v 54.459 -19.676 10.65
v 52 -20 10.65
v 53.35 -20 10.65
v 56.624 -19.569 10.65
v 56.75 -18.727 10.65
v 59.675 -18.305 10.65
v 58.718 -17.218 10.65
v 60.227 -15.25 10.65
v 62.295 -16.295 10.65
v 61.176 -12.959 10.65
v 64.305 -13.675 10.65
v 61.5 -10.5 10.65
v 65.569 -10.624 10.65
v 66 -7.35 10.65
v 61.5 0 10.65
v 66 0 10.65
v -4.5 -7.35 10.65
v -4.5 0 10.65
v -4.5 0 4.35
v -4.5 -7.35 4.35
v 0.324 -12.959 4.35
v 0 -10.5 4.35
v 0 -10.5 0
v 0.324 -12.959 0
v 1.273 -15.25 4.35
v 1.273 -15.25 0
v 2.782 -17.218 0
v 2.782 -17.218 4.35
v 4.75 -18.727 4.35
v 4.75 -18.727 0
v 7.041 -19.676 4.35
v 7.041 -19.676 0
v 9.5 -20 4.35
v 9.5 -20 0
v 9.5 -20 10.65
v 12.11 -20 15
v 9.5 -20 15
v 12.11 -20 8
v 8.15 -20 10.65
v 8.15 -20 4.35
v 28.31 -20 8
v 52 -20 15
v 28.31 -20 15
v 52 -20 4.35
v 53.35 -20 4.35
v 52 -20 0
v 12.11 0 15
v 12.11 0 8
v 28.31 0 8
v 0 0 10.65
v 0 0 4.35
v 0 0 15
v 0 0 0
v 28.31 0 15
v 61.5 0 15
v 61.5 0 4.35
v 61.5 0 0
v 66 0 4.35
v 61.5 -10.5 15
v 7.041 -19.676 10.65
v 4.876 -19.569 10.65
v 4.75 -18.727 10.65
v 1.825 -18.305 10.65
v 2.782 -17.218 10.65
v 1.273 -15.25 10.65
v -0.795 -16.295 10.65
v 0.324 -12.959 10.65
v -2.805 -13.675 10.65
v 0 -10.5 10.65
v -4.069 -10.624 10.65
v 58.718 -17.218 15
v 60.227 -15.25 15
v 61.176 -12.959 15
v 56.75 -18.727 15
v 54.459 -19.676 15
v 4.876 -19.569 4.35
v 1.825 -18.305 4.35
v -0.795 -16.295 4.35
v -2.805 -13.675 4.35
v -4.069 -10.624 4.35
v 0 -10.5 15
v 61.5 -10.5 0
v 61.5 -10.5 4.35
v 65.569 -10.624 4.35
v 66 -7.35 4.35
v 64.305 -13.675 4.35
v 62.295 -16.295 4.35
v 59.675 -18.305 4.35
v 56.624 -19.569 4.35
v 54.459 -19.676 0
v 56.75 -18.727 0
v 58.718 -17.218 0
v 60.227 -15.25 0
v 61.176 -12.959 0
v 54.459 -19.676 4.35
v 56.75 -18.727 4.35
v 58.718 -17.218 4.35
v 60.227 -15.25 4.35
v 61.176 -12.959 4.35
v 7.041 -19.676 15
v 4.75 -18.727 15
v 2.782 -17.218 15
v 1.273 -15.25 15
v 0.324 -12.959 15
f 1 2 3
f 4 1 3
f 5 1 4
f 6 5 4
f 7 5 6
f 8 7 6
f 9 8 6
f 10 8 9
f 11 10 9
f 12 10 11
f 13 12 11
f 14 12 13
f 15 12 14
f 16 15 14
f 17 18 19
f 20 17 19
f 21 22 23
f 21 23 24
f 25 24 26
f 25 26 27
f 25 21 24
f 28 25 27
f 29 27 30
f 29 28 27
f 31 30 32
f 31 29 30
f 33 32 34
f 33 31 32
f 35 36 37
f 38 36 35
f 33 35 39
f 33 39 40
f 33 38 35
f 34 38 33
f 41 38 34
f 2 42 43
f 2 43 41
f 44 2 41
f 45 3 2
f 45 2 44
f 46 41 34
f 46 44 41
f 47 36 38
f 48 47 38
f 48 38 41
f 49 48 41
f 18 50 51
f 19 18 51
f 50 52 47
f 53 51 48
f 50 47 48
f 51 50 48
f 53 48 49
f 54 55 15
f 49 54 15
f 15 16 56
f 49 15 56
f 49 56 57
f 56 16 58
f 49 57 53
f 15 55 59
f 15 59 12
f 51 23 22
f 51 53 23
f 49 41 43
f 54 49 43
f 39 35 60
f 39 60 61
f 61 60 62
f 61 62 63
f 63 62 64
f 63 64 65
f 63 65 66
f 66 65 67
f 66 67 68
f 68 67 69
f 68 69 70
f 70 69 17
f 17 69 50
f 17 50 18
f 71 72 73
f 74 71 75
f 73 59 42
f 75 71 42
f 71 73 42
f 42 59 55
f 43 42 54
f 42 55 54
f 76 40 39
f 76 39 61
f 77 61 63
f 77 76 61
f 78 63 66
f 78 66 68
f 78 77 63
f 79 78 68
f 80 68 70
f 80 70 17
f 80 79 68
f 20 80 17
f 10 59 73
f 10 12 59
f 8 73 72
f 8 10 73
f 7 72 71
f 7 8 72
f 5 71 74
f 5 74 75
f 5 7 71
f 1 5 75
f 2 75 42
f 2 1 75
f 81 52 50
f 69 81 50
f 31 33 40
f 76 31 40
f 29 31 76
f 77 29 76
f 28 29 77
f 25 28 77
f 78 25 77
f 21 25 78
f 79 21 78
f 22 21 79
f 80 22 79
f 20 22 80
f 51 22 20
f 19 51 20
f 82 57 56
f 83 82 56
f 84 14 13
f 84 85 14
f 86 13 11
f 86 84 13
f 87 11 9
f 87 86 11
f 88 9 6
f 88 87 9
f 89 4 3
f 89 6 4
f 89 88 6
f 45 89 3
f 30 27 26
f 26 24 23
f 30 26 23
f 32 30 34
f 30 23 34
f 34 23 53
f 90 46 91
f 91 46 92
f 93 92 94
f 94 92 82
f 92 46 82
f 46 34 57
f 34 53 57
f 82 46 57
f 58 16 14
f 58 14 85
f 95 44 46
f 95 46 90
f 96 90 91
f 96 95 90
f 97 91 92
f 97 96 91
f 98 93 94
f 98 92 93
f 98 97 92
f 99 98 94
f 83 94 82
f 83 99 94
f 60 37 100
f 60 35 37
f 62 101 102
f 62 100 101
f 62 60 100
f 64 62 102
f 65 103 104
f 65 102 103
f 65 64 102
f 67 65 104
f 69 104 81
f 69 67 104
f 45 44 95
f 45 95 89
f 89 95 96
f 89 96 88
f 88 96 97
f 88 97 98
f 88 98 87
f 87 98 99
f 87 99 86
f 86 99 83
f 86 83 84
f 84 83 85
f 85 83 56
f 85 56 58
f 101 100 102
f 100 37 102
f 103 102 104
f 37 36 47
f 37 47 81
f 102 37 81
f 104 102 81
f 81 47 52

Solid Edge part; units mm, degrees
sketch "Sketch1" plane through (0, 0, 0) normal (0, -1, 0) x (1, 0, 0)
  line L0 (61.5, 15) -> (0, 15)
  line L1 (0, 15) -> (0, 10.65)
  line L2 (0, 10.65) -> (-4.5, 10.65)
  line L3 (-4.5, 10.65) -> (-4.5, 4.35)
  line L4 (0, 4.35) -> (-4.5, 4.35)
  line L5 (0, 0) -> (0, 4.35)
  line L6 (0, 0) -> (61.5, 0)
  line L7 (61.5, 0) -> (61.5, 4.35)
  line L8 (61.5, 4.35) -> (66, 4.35)
  line L9 (66, 10.65) -> (66, 4.35)
  line L10 (61.5, 10.65) -> (66, 10.65)
  line L11 (61.5, 15) -> (61.5, 10.65)
extrude "Protrusion1" add sketch "Sketch1" along normal blind 20
fillet "Round_2" radius 9.5 4 edges at (0, -20, 12.825) (0, -20, 2.175) (61.5, -20, 2.175) (61.5, -20, 12.825)
fillet "Round1" radius 12.65 2 edges at (-4.5, -20, 7.5) (66, -20, 7.5)
sketch "Sketch2" plane through (30.75, 0, 7.5) normal (0, 1, 0) x (1, 0, 0)
  line L0 (-2.44, -0.5) -> (-2.44, -7.5)
  line L1 (-2.59, -7.5) -> (-2.44, -7.5)
  line L2 (-18.49, -7.5) -> (-2.59, -7.5)
  line L3 (-18.64, -7.5) -> (-18.49, -7.5)
  line L4 (-18.64, -7.5) -> (-18.64, -0.5)
  line L5 (-18.64, -0.5) -> (-2.44, -0.5)
extrude "ExtrudedCutout_1" cut sketch "Sketch2" along normal mid plane 42.3972
